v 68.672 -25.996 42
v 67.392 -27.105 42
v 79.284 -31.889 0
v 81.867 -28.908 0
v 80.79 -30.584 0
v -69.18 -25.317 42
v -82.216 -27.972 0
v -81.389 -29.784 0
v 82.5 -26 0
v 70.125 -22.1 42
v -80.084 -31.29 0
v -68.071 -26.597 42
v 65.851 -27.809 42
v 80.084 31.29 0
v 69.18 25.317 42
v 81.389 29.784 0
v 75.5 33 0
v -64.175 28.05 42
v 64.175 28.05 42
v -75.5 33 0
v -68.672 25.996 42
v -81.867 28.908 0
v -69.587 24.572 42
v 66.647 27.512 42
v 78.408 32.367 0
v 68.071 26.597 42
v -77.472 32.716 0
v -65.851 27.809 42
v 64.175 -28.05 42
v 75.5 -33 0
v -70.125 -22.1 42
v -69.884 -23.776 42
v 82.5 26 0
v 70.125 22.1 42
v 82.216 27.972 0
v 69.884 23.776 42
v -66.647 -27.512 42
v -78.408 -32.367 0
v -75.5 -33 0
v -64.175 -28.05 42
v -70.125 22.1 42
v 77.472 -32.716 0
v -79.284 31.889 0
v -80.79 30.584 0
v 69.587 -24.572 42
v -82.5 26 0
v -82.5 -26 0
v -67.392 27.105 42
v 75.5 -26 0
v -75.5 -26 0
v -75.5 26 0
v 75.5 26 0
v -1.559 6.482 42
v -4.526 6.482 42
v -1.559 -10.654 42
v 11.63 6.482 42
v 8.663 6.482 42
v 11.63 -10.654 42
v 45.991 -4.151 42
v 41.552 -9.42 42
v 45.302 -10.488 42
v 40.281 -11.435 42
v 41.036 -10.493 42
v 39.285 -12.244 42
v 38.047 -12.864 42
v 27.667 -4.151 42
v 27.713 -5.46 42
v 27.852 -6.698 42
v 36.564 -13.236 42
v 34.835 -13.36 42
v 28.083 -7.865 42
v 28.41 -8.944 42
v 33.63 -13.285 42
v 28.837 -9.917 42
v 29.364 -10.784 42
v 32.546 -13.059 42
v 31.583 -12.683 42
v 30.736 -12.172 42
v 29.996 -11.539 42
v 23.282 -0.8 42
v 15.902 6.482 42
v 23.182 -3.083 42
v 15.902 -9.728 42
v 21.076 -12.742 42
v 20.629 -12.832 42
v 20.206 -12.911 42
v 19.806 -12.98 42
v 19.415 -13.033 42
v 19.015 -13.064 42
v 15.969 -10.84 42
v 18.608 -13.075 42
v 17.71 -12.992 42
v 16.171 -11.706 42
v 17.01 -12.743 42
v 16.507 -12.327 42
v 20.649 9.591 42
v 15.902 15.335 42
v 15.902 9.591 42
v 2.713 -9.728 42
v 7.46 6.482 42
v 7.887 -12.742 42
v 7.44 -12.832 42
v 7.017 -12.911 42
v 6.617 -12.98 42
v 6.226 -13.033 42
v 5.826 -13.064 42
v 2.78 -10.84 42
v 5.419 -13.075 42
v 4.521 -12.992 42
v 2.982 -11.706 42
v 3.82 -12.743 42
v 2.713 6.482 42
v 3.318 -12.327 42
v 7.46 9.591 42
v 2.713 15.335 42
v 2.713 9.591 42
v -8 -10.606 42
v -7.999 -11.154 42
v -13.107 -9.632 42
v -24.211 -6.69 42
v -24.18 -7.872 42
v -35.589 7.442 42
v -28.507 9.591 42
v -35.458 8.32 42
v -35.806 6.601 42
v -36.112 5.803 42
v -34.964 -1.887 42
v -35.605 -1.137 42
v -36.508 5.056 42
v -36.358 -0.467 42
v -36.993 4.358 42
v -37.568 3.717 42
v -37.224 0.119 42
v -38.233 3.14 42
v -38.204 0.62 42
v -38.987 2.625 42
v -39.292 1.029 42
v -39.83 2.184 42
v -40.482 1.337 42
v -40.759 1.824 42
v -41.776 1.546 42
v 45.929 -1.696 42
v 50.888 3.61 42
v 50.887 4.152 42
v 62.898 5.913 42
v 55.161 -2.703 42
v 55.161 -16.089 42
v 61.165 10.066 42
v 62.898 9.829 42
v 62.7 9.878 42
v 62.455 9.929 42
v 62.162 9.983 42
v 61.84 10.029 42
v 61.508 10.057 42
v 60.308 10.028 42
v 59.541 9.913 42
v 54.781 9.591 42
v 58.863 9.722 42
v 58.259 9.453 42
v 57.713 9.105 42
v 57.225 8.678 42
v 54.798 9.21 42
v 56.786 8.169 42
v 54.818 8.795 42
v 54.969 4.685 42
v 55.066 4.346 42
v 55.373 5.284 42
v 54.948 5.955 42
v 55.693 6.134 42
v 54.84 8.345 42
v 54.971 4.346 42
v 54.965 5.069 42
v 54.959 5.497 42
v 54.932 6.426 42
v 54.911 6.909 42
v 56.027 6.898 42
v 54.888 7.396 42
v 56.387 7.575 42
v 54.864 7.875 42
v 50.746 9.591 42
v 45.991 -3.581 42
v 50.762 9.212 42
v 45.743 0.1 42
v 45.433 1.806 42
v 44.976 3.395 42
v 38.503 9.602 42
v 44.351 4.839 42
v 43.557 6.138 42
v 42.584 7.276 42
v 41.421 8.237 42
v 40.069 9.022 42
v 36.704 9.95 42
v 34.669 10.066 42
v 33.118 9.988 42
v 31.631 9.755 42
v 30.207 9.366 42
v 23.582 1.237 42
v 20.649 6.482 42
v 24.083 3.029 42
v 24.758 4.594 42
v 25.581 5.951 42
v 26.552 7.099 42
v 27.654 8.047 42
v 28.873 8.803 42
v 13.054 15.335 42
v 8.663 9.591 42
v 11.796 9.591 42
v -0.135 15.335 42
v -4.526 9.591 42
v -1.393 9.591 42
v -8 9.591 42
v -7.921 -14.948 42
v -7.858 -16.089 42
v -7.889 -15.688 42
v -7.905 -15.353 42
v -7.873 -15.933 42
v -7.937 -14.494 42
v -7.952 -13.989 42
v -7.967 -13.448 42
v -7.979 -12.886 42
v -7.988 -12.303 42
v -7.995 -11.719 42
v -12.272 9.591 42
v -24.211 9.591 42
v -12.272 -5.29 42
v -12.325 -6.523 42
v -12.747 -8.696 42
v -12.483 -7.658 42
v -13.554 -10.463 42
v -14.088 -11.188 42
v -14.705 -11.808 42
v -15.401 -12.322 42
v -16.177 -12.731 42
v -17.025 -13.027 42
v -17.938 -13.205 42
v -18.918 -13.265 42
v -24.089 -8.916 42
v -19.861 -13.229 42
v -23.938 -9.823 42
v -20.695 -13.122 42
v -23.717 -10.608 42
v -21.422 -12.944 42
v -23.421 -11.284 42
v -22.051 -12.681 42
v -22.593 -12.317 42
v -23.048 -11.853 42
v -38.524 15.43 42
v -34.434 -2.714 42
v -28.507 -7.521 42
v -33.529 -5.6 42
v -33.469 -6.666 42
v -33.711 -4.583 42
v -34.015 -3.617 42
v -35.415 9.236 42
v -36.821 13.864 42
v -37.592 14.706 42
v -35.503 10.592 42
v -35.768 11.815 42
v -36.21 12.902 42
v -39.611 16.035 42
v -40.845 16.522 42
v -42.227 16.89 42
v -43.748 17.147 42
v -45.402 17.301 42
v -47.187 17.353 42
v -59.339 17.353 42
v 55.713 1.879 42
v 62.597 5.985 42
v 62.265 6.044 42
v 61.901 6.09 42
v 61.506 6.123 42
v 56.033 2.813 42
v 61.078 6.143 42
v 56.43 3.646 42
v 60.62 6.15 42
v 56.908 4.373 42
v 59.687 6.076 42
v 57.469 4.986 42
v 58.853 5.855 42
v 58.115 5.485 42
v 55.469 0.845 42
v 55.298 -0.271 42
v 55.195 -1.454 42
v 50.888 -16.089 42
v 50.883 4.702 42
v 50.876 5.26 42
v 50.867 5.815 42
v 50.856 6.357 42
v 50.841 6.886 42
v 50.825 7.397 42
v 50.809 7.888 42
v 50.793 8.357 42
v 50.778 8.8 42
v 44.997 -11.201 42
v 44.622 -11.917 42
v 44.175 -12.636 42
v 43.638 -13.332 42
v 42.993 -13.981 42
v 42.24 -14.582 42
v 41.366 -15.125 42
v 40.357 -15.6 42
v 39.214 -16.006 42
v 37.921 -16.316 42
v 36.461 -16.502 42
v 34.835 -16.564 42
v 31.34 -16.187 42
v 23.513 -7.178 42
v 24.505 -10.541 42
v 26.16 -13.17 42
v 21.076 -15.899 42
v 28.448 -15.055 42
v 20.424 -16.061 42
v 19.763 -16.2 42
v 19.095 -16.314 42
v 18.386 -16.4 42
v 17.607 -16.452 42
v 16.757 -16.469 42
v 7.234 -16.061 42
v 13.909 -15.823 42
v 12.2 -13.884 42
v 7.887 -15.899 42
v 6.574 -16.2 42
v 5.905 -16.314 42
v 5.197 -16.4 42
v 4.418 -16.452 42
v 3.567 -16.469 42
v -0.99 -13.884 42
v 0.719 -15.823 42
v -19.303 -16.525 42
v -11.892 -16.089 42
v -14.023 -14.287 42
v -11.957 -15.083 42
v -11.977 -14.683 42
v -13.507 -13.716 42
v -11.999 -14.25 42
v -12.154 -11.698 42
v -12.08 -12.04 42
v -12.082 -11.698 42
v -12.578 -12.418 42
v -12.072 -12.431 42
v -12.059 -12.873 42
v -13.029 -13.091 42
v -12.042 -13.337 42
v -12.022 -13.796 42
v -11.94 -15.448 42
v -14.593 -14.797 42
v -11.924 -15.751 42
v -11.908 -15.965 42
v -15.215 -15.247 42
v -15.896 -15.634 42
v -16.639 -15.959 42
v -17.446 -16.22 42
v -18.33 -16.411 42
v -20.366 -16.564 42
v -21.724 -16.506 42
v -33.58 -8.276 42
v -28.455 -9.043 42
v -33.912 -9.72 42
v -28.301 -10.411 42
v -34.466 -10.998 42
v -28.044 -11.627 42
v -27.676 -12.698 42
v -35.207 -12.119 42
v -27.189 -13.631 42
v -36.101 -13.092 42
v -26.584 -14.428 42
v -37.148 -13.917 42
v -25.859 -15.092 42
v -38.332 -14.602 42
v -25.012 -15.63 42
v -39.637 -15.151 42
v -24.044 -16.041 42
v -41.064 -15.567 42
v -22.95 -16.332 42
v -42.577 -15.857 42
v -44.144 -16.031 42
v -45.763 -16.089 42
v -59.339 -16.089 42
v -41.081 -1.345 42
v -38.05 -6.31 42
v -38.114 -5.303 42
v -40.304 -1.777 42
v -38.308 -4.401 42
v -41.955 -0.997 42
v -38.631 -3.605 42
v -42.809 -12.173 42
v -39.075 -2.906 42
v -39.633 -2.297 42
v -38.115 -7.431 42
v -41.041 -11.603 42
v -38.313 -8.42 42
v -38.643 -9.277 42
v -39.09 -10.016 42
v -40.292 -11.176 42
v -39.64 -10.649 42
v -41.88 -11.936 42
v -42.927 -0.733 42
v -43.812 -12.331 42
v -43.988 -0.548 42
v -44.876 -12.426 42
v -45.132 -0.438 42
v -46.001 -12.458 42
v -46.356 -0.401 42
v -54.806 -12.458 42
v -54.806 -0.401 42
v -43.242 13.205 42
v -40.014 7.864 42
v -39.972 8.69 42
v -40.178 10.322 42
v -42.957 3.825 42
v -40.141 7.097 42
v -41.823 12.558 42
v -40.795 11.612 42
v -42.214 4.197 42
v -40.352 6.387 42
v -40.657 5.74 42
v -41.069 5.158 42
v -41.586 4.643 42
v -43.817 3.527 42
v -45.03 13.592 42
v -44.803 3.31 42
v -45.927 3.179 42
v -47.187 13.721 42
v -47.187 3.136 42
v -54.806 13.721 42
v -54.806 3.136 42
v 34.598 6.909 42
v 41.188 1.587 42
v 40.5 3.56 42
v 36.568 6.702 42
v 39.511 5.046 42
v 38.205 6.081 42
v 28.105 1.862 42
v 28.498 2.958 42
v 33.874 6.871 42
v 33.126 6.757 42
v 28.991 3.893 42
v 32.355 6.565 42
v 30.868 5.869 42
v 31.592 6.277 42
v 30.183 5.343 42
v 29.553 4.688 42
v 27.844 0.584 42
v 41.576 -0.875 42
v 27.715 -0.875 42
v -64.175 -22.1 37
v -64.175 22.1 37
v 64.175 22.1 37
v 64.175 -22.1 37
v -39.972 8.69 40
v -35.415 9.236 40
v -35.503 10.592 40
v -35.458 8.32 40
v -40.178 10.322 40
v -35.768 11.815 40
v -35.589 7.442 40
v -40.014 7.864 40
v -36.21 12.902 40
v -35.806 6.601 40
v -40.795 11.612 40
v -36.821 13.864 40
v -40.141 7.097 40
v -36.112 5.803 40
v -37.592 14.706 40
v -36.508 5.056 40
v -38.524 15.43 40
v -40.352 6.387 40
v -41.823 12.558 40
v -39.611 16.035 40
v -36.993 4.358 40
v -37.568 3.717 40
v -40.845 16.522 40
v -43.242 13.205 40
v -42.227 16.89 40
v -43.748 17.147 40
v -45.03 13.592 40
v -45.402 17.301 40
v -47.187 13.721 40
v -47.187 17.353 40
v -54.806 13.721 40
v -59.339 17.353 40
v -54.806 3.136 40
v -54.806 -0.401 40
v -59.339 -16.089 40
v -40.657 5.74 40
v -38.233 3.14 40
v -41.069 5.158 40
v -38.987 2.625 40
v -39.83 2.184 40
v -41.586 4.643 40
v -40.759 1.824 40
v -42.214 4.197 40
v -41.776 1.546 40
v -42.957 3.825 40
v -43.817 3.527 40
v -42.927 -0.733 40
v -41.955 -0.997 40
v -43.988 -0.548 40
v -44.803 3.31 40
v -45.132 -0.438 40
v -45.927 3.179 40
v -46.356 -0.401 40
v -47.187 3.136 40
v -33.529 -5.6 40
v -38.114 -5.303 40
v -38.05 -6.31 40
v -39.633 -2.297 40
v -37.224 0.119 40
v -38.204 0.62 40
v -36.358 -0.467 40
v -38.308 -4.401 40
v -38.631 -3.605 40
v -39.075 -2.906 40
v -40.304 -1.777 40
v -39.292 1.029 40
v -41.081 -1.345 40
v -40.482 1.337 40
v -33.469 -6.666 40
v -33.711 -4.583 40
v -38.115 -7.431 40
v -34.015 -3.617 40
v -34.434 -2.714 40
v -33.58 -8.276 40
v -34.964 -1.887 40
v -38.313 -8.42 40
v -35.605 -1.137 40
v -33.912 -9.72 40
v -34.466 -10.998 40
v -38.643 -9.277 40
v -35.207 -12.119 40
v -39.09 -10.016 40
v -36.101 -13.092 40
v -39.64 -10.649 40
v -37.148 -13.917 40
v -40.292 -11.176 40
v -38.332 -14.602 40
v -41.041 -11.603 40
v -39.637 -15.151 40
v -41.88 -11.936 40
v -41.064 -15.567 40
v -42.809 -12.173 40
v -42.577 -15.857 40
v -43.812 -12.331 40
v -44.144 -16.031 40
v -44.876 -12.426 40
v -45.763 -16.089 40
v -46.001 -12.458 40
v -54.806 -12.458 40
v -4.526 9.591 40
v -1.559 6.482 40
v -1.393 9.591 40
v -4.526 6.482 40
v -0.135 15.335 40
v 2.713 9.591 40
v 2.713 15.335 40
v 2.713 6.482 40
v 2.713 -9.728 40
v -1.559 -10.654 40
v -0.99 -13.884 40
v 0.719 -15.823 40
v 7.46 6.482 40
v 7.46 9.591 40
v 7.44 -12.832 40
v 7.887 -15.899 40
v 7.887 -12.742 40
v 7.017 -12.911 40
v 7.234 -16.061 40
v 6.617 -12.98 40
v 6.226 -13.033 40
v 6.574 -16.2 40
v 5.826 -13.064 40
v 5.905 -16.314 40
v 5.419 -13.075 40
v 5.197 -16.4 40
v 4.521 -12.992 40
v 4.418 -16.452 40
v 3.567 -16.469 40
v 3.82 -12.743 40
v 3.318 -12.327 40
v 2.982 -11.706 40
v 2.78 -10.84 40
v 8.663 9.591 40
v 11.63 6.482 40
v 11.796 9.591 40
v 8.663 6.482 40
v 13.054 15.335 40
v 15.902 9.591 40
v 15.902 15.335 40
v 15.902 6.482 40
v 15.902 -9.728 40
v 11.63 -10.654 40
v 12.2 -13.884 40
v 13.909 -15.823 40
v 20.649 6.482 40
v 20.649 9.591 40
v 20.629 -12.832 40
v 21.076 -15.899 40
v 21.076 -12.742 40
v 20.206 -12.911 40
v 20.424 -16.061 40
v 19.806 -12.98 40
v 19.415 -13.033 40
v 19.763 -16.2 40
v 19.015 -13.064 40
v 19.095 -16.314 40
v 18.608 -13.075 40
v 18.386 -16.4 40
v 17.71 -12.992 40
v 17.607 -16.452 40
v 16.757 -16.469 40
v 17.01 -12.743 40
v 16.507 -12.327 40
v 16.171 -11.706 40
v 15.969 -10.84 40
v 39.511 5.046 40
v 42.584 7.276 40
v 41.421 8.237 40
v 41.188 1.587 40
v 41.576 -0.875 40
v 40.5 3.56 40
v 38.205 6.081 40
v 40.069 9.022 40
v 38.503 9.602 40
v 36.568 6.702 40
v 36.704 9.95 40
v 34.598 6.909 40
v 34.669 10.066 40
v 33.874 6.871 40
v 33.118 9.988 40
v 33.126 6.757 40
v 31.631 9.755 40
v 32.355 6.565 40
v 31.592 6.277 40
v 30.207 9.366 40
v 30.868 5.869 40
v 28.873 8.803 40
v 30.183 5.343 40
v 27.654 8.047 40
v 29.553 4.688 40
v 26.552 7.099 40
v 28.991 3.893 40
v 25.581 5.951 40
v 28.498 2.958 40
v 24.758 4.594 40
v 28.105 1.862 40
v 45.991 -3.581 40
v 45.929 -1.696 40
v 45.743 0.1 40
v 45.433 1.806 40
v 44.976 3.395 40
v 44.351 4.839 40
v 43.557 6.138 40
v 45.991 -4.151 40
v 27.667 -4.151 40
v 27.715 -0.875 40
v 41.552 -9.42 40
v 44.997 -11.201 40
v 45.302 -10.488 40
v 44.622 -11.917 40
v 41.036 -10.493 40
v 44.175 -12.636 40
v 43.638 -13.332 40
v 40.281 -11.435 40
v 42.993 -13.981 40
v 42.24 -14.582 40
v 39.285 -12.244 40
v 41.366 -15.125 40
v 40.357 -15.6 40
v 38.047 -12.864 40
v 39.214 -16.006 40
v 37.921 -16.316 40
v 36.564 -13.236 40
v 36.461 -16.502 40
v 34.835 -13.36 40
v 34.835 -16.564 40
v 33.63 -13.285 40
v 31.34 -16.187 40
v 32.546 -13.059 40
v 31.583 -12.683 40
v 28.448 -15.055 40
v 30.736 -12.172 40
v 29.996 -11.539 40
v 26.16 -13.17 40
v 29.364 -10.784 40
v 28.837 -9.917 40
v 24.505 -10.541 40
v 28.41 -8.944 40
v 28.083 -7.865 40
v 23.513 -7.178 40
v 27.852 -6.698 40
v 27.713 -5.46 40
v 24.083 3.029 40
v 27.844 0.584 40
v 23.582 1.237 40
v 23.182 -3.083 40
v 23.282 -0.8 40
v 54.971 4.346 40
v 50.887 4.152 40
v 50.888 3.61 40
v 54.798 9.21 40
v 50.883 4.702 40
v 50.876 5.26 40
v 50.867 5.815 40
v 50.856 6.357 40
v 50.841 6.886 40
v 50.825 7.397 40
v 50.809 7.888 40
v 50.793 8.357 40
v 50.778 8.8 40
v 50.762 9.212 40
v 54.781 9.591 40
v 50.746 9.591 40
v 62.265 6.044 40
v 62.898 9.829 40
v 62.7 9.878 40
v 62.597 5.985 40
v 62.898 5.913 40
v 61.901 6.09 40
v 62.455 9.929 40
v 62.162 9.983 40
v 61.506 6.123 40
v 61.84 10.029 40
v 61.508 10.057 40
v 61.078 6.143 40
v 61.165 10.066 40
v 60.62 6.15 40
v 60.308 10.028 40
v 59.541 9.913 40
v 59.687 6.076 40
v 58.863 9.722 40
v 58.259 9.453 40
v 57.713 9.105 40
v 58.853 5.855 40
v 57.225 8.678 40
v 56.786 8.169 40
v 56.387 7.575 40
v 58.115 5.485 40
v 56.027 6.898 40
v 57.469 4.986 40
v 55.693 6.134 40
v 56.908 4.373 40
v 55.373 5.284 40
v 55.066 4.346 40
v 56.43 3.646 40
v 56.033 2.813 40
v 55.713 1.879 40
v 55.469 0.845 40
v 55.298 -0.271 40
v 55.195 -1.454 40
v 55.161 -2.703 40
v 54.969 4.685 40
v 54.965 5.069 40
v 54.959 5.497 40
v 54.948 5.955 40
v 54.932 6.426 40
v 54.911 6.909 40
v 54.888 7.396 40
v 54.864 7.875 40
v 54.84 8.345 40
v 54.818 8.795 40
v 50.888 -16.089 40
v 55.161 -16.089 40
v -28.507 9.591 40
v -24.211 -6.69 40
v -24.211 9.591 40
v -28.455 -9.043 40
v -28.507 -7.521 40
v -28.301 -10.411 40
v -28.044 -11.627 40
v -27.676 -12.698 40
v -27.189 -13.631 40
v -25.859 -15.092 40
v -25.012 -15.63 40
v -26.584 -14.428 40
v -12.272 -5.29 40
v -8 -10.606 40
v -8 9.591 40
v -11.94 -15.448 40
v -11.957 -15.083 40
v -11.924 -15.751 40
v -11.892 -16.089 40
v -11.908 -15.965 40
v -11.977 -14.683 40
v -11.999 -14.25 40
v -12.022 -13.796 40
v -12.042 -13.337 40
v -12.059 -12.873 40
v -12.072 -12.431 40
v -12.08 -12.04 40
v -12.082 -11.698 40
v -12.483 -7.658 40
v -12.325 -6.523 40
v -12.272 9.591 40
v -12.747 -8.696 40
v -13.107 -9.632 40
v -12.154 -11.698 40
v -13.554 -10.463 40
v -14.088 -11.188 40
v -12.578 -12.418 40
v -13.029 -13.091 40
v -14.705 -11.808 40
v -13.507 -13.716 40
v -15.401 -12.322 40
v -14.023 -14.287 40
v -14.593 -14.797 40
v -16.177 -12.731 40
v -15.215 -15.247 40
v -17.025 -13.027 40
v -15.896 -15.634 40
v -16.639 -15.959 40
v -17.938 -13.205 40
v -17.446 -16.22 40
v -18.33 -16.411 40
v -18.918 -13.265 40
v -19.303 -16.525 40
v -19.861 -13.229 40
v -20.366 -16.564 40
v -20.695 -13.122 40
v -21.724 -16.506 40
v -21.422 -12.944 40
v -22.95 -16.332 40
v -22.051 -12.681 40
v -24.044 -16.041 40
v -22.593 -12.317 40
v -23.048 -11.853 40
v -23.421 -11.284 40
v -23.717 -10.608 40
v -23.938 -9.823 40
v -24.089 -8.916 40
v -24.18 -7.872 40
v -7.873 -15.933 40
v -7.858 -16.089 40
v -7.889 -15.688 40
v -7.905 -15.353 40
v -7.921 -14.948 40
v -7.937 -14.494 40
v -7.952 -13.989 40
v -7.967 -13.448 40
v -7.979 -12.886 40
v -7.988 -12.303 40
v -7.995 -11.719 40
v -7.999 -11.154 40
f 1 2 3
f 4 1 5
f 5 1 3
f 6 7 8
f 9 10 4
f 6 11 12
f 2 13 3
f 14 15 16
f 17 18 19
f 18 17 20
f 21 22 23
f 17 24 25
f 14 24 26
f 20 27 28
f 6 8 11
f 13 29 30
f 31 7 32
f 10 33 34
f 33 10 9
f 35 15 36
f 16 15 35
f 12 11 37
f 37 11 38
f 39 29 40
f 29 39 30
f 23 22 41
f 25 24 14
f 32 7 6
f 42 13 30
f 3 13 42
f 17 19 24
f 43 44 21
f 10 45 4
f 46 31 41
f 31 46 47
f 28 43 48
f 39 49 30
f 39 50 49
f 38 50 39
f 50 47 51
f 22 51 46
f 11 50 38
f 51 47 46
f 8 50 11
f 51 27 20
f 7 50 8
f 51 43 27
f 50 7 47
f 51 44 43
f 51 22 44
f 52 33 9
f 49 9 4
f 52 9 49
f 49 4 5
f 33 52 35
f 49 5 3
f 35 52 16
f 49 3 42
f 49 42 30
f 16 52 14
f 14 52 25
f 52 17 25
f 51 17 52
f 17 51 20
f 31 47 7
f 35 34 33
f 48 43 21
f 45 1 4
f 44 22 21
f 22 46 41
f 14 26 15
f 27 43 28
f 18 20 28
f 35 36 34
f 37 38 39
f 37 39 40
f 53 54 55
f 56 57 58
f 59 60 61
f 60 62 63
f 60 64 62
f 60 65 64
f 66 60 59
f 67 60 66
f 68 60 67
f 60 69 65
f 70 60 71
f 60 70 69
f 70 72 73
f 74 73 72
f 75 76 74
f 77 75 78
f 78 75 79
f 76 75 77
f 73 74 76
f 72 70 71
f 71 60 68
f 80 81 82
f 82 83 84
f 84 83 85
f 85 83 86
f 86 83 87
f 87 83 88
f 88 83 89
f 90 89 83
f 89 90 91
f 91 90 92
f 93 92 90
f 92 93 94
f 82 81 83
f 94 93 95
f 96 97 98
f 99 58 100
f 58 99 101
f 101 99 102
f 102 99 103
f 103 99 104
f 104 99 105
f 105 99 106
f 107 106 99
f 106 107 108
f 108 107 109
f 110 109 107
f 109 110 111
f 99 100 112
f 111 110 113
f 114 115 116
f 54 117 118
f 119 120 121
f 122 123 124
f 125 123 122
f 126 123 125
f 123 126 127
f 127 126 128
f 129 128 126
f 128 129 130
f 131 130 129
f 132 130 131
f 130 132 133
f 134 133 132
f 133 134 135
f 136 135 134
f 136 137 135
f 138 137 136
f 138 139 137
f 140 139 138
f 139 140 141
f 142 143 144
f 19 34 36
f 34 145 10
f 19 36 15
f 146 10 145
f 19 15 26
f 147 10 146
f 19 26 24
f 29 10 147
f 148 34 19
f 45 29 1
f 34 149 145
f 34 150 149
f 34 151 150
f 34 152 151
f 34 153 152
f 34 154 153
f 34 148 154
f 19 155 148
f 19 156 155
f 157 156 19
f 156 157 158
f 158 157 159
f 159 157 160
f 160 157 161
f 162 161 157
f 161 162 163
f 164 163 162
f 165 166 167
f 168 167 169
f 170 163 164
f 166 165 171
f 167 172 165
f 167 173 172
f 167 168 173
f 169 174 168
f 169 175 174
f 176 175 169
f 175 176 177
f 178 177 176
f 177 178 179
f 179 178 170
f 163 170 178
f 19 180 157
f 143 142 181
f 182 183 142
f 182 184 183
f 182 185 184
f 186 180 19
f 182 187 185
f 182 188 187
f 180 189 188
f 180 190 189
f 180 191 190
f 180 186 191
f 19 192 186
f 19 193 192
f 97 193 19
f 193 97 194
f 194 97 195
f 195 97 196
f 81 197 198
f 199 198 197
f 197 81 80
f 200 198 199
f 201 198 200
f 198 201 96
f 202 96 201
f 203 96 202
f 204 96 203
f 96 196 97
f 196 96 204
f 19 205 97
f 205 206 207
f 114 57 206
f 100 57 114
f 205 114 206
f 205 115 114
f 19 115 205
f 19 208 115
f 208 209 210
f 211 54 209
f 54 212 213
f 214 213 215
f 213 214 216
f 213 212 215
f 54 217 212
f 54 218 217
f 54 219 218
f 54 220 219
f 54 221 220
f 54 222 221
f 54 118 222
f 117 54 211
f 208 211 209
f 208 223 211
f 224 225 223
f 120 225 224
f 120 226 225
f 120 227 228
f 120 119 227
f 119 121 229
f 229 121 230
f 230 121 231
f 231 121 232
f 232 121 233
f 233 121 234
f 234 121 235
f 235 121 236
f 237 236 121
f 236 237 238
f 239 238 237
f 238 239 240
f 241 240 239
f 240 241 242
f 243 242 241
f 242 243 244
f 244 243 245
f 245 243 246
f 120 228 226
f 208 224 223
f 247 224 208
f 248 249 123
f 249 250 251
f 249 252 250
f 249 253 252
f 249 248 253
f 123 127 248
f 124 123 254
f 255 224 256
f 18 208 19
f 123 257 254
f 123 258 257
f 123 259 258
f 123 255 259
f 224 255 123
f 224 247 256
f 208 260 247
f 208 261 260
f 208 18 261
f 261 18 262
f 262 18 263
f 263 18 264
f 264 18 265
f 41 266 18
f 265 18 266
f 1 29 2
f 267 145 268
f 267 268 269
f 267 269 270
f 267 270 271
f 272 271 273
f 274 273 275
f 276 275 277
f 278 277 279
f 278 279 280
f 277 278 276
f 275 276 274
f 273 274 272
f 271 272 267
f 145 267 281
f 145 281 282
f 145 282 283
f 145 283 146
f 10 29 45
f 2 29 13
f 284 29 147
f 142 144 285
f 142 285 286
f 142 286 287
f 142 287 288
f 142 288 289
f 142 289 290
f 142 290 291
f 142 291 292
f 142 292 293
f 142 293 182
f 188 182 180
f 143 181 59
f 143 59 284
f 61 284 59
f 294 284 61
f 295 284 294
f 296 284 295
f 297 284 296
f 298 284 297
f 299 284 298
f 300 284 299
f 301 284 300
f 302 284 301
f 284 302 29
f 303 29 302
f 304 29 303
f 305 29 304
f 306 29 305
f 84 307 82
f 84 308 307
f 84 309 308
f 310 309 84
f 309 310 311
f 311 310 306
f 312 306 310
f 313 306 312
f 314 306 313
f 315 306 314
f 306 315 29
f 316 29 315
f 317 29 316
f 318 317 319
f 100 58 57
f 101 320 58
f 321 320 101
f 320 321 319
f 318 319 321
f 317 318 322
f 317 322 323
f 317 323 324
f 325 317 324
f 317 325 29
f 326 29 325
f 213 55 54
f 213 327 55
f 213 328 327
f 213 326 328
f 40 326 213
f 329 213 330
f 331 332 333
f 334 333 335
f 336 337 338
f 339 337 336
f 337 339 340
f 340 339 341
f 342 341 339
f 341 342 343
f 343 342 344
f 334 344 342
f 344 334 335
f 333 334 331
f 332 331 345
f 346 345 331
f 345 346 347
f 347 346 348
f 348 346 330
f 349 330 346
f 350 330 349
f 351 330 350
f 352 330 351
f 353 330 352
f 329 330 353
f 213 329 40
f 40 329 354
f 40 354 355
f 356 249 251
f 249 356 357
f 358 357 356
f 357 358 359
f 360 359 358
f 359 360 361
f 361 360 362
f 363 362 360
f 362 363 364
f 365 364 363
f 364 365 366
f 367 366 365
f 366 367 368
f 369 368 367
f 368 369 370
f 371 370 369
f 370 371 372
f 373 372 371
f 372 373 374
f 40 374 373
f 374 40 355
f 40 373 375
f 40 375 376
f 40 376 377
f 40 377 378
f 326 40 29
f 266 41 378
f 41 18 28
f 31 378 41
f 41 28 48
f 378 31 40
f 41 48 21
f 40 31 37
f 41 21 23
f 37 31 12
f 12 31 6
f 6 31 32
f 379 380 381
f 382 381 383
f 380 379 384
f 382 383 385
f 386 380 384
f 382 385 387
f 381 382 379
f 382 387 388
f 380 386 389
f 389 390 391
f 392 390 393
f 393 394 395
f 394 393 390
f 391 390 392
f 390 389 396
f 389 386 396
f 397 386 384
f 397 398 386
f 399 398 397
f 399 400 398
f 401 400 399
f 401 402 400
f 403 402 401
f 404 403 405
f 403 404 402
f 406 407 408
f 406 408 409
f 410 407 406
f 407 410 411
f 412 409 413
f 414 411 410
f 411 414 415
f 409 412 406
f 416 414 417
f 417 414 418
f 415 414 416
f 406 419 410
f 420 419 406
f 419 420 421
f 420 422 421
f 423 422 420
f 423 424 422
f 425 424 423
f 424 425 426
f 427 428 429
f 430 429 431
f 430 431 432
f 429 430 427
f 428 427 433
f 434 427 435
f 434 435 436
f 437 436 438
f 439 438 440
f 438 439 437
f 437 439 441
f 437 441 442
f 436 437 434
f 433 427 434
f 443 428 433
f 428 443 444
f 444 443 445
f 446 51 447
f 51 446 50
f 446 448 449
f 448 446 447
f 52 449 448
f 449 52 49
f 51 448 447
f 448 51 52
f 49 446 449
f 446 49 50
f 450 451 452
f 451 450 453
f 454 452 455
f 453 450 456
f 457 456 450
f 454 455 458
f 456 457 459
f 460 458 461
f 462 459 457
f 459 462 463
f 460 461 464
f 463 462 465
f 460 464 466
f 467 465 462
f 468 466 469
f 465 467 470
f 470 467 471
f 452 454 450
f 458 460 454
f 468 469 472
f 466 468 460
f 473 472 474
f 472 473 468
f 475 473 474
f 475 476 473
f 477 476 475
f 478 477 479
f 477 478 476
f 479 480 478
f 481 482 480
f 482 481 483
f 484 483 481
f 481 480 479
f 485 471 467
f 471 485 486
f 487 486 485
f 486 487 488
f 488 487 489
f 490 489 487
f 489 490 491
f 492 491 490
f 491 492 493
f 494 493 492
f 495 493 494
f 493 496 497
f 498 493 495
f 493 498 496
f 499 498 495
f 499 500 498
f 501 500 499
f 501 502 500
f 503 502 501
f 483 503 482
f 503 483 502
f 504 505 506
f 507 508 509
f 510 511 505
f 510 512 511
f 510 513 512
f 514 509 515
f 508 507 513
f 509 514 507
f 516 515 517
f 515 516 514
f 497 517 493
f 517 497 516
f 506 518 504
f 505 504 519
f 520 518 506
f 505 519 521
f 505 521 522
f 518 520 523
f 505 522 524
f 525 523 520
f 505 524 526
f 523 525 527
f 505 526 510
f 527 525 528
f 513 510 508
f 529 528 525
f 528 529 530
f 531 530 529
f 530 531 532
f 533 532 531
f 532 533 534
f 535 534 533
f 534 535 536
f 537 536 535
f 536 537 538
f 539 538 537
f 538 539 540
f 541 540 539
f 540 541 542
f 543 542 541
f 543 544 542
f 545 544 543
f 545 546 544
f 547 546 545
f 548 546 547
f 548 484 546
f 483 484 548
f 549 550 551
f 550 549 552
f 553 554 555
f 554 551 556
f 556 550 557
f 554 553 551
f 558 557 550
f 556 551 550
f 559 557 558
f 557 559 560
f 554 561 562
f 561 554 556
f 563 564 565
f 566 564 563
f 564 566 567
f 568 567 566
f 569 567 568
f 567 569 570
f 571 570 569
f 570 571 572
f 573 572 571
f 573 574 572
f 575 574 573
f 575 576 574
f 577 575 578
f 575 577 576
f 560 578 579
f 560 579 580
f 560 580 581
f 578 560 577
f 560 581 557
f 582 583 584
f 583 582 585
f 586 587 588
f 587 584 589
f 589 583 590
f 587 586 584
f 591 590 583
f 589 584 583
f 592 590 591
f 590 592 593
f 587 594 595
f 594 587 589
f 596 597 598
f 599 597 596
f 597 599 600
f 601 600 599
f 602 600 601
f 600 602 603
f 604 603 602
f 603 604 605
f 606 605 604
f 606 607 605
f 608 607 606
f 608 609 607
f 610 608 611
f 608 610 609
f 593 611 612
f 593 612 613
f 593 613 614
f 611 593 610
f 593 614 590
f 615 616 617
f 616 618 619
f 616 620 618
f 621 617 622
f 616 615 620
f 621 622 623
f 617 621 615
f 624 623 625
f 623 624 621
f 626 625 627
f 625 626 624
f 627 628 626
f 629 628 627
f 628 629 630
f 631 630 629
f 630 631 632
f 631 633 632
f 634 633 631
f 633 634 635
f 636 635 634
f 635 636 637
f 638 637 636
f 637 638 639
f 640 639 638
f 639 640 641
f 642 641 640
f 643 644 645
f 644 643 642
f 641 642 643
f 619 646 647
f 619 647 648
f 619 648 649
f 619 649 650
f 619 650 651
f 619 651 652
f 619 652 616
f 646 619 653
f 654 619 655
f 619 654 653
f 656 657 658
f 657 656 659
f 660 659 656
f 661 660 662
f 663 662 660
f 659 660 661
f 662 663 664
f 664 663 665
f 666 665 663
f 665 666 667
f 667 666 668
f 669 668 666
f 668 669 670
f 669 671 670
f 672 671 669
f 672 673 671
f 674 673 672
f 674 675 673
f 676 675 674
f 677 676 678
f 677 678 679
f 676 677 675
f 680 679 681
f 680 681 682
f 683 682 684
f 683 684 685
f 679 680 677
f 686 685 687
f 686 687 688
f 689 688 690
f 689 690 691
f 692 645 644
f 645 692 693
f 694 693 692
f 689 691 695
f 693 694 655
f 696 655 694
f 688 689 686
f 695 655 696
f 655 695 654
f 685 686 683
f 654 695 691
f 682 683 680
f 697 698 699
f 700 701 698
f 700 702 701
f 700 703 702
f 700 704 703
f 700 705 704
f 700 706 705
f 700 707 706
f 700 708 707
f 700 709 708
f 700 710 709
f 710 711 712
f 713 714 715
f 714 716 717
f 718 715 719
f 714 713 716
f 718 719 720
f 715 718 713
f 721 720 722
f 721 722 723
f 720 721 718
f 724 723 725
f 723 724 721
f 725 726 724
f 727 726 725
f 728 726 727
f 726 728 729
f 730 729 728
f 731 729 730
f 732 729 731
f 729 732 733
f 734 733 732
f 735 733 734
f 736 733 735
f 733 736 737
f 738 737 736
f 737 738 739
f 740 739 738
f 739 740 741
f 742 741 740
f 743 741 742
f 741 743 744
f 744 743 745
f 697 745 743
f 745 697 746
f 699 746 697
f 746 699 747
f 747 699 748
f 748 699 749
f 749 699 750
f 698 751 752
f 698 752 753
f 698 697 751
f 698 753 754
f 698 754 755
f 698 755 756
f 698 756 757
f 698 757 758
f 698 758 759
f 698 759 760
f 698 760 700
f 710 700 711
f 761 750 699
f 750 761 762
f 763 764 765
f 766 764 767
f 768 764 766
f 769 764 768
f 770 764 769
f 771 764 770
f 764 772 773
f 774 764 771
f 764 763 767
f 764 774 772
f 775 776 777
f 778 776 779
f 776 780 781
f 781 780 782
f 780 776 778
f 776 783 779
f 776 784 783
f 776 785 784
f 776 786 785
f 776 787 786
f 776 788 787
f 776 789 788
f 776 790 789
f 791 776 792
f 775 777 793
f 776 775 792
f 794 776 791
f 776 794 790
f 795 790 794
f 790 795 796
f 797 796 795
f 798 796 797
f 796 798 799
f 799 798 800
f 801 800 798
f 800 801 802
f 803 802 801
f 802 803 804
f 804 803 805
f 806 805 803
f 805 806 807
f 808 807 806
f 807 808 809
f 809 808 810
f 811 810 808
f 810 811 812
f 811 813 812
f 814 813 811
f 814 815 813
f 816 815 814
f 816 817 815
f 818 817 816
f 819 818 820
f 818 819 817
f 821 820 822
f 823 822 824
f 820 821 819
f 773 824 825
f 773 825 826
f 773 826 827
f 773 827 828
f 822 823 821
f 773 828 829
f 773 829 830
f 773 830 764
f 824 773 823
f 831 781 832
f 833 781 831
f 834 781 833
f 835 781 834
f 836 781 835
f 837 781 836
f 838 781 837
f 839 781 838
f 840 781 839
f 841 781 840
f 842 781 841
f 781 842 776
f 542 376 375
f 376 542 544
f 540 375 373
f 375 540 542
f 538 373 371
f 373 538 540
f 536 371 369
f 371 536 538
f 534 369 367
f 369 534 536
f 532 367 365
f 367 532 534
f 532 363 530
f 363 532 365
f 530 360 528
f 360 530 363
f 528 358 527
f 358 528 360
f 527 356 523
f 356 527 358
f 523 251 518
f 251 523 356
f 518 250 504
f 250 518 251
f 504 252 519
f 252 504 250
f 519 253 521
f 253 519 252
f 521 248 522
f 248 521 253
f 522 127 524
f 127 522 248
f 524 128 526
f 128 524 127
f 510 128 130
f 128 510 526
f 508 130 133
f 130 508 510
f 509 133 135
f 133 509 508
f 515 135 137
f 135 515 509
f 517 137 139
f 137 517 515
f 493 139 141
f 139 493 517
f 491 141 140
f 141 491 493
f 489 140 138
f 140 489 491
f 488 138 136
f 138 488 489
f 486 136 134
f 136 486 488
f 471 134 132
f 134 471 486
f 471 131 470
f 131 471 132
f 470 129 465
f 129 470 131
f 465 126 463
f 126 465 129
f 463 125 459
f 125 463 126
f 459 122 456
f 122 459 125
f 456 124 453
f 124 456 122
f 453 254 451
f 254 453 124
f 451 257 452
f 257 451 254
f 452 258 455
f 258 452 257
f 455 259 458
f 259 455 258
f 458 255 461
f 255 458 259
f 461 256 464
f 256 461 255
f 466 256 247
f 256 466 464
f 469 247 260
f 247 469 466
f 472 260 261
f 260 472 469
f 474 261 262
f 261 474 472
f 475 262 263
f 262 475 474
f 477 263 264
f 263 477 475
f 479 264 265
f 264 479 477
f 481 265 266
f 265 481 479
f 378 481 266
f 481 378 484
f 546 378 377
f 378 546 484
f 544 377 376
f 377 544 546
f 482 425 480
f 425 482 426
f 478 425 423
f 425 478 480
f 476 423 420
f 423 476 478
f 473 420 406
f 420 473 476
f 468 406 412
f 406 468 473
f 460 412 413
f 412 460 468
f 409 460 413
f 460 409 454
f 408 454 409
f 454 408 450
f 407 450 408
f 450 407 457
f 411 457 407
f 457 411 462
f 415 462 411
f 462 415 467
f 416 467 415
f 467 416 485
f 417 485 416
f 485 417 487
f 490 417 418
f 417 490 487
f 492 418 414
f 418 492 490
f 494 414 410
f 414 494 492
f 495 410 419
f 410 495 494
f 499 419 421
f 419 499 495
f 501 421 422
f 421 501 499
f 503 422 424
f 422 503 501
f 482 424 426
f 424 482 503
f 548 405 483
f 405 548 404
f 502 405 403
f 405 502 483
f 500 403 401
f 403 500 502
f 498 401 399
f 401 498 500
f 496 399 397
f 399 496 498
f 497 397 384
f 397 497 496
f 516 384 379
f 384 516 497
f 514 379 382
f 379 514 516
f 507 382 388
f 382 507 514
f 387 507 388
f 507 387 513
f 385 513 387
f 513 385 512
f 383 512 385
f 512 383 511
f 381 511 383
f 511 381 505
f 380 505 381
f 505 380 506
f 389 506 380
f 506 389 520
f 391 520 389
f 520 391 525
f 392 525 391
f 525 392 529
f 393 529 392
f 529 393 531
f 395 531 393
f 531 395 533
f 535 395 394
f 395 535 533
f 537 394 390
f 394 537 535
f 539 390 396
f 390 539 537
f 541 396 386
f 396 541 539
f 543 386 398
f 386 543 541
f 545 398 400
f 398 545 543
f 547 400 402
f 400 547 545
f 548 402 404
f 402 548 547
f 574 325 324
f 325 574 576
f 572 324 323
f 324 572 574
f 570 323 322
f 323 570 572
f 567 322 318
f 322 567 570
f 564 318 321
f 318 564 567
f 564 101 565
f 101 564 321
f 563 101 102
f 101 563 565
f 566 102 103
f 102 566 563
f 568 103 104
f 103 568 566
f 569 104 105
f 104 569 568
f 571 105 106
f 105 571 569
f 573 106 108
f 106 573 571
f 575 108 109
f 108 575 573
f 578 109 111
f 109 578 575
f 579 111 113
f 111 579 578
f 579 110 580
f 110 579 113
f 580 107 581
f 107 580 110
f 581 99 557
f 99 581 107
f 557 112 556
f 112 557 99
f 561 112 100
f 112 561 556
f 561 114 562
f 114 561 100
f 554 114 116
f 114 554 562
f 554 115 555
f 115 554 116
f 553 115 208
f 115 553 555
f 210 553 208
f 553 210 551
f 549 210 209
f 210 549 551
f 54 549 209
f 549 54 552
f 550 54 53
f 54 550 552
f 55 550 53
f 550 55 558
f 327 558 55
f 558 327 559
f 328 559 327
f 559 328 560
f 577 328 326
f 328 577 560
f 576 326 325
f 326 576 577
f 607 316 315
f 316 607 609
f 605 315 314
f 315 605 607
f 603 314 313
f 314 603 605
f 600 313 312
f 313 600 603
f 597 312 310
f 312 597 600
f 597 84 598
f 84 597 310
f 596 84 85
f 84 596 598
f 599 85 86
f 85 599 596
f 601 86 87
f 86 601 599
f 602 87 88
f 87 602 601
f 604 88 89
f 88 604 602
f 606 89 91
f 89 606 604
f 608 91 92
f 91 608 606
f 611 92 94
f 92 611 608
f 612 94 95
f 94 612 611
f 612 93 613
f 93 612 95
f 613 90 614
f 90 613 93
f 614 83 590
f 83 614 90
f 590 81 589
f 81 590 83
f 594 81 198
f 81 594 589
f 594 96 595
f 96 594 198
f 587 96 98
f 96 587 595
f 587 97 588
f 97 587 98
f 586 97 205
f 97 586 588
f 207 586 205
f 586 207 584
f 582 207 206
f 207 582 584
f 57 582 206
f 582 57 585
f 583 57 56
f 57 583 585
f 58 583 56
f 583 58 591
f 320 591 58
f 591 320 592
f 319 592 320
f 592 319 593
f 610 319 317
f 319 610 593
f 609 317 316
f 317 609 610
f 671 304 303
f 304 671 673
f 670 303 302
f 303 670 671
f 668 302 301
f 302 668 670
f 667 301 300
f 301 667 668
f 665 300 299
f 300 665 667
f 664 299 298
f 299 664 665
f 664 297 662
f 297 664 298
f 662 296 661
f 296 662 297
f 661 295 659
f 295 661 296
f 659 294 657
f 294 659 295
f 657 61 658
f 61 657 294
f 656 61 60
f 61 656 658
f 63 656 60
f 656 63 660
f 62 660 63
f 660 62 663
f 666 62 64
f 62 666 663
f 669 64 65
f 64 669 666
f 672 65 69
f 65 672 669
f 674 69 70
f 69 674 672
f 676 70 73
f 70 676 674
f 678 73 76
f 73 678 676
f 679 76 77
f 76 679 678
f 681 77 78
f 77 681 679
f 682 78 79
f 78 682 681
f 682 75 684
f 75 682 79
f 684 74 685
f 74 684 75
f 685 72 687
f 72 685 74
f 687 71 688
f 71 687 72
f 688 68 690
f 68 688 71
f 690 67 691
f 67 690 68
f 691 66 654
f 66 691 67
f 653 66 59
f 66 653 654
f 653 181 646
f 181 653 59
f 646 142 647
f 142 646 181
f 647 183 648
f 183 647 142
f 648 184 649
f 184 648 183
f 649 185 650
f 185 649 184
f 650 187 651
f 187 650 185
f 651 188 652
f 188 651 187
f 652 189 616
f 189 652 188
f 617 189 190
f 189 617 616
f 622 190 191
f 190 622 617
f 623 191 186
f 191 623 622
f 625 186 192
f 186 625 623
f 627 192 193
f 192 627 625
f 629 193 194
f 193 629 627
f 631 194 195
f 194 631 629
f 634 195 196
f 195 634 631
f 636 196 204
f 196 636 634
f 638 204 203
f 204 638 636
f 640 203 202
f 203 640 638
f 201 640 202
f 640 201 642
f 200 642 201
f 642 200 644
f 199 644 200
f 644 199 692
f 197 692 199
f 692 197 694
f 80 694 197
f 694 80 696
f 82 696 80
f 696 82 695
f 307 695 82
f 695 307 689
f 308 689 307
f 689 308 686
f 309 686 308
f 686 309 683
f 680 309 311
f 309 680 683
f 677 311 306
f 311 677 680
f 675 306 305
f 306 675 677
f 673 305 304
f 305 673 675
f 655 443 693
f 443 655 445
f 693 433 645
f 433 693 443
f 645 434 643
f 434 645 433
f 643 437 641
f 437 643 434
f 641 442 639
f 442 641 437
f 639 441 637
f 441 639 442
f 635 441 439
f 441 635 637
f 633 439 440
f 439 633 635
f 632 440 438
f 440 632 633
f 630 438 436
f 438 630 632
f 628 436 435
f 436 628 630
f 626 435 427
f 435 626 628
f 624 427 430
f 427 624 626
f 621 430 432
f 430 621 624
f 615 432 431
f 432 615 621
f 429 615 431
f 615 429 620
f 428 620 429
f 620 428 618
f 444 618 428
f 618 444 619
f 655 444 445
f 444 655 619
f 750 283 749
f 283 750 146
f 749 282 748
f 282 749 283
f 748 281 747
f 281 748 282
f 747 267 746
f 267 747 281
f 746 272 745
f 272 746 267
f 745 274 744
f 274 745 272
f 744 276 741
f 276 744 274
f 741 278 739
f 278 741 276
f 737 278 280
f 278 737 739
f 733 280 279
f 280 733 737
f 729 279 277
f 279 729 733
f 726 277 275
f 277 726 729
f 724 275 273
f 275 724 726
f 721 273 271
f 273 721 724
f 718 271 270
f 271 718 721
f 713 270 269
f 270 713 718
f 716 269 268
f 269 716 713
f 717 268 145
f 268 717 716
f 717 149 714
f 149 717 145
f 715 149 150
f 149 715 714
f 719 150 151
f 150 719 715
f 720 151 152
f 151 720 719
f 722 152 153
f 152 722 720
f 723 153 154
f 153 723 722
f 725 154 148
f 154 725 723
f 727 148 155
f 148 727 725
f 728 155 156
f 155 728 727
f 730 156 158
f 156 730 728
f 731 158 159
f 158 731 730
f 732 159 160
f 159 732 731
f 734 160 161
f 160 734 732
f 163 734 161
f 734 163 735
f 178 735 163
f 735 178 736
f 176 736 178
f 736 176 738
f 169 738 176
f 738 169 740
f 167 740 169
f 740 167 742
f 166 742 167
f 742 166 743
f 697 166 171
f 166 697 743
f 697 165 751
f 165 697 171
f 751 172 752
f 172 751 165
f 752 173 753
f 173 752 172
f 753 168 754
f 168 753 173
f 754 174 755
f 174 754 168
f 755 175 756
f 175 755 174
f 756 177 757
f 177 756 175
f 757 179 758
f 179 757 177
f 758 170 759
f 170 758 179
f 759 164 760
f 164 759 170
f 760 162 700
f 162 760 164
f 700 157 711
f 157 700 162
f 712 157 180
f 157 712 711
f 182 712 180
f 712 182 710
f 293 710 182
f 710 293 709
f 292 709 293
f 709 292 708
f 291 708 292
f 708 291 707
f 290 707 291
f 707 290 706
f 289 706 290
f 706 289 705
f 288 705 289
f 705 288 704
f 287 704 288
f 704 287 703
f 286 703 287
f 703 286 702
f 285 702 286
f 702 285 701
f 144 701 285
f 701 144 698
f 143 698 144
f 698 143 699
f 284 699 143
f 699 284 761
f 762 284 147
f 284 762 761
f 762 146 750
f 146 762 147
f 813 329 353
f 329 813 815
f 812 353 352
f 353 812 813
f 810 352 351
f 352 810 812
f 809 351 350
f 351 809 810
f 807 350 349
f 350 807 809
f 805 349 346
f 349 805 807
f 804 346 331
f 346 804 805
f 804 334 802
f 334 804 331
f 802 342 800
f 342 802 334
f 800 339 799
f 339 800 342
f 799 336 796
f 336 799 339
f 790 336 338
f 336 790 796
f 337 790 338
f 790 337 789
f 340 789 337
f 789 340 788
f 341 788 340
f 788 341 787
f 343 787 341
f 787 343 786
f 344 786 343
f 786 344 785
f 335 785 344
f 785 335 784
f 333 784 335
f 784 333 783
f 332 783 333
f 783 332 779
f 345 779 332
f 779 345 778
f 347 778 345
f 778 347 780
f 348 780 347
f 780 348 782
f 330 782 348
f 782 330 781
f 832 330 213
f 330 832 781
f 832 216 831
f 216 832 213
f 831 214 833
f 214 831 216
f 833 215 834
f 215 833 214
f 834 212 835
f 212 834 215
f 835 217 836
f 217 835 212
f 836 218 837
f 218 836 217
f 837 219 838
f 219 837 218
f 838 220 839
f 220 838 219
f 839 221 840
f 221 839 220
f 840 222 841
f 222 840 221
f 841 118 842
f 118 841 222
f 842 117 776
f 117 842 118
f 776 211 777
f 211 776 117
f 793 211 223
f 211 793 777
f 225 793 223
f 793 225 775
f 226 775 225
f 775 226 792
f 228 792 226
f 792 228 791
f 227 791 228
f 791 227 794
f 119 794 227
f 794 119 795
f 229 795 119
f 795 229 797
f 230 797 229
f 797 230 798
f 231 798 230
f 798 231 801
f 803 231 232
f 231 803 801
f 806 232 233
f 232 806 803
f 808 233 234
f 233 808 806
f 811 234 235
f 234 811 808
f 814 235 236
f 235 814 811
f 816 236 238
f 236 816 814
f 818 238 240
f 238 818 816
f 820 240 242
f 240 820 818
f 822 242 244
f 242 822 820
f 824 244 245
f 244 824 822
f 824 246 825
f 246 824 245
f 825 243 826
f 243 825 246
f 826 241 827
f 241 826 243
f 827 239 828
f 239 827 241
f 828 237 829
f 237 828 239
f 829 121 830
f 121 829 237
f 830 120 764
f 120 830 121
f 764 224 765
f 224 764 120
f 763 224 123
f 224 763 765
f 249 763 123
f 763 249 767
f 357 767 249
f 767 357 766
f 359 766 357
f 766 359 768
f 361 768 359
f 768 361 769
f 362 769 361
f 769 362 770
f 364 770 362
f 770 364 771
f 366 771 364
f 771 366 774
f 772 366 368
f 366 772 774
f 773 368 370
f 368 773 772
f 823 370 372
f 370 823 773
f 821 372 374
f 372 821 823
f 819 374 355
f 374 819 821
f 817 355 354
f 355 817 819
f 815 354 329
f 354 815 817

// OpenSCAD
font = "Liberation Sans";

cube_length=121;
cube_width=32;

letter_size = 50;
letter_height = 5;



movem=300;
cover_length=cube_length+30;
cover_width=cube_width+20;
cover_height=cube_width+10;
cover_scale=0.85;


difference() {
    linear_extrude(cover_height, scale=cover_scale)
    difference() {
        offset(7) square([cover_length, cover_width], true);
    }


    linear_extrude(cover_height-5, scale=cover_scale)
    difference() {
        square([cover_length, cover_width], true);
    }
    
    translate([0,0,cover_height])
    mirror([0,0,1]) 
    linear_extrude(2)
    text("Butter", 
        size = 35, 
        font = font, 
        halign = "center", 
        valign = "center", 
        $fn = 16);

}

/* Butter Stick */
//linear_extrude(cube_width)
//square([cube_length, cube_width], true);
